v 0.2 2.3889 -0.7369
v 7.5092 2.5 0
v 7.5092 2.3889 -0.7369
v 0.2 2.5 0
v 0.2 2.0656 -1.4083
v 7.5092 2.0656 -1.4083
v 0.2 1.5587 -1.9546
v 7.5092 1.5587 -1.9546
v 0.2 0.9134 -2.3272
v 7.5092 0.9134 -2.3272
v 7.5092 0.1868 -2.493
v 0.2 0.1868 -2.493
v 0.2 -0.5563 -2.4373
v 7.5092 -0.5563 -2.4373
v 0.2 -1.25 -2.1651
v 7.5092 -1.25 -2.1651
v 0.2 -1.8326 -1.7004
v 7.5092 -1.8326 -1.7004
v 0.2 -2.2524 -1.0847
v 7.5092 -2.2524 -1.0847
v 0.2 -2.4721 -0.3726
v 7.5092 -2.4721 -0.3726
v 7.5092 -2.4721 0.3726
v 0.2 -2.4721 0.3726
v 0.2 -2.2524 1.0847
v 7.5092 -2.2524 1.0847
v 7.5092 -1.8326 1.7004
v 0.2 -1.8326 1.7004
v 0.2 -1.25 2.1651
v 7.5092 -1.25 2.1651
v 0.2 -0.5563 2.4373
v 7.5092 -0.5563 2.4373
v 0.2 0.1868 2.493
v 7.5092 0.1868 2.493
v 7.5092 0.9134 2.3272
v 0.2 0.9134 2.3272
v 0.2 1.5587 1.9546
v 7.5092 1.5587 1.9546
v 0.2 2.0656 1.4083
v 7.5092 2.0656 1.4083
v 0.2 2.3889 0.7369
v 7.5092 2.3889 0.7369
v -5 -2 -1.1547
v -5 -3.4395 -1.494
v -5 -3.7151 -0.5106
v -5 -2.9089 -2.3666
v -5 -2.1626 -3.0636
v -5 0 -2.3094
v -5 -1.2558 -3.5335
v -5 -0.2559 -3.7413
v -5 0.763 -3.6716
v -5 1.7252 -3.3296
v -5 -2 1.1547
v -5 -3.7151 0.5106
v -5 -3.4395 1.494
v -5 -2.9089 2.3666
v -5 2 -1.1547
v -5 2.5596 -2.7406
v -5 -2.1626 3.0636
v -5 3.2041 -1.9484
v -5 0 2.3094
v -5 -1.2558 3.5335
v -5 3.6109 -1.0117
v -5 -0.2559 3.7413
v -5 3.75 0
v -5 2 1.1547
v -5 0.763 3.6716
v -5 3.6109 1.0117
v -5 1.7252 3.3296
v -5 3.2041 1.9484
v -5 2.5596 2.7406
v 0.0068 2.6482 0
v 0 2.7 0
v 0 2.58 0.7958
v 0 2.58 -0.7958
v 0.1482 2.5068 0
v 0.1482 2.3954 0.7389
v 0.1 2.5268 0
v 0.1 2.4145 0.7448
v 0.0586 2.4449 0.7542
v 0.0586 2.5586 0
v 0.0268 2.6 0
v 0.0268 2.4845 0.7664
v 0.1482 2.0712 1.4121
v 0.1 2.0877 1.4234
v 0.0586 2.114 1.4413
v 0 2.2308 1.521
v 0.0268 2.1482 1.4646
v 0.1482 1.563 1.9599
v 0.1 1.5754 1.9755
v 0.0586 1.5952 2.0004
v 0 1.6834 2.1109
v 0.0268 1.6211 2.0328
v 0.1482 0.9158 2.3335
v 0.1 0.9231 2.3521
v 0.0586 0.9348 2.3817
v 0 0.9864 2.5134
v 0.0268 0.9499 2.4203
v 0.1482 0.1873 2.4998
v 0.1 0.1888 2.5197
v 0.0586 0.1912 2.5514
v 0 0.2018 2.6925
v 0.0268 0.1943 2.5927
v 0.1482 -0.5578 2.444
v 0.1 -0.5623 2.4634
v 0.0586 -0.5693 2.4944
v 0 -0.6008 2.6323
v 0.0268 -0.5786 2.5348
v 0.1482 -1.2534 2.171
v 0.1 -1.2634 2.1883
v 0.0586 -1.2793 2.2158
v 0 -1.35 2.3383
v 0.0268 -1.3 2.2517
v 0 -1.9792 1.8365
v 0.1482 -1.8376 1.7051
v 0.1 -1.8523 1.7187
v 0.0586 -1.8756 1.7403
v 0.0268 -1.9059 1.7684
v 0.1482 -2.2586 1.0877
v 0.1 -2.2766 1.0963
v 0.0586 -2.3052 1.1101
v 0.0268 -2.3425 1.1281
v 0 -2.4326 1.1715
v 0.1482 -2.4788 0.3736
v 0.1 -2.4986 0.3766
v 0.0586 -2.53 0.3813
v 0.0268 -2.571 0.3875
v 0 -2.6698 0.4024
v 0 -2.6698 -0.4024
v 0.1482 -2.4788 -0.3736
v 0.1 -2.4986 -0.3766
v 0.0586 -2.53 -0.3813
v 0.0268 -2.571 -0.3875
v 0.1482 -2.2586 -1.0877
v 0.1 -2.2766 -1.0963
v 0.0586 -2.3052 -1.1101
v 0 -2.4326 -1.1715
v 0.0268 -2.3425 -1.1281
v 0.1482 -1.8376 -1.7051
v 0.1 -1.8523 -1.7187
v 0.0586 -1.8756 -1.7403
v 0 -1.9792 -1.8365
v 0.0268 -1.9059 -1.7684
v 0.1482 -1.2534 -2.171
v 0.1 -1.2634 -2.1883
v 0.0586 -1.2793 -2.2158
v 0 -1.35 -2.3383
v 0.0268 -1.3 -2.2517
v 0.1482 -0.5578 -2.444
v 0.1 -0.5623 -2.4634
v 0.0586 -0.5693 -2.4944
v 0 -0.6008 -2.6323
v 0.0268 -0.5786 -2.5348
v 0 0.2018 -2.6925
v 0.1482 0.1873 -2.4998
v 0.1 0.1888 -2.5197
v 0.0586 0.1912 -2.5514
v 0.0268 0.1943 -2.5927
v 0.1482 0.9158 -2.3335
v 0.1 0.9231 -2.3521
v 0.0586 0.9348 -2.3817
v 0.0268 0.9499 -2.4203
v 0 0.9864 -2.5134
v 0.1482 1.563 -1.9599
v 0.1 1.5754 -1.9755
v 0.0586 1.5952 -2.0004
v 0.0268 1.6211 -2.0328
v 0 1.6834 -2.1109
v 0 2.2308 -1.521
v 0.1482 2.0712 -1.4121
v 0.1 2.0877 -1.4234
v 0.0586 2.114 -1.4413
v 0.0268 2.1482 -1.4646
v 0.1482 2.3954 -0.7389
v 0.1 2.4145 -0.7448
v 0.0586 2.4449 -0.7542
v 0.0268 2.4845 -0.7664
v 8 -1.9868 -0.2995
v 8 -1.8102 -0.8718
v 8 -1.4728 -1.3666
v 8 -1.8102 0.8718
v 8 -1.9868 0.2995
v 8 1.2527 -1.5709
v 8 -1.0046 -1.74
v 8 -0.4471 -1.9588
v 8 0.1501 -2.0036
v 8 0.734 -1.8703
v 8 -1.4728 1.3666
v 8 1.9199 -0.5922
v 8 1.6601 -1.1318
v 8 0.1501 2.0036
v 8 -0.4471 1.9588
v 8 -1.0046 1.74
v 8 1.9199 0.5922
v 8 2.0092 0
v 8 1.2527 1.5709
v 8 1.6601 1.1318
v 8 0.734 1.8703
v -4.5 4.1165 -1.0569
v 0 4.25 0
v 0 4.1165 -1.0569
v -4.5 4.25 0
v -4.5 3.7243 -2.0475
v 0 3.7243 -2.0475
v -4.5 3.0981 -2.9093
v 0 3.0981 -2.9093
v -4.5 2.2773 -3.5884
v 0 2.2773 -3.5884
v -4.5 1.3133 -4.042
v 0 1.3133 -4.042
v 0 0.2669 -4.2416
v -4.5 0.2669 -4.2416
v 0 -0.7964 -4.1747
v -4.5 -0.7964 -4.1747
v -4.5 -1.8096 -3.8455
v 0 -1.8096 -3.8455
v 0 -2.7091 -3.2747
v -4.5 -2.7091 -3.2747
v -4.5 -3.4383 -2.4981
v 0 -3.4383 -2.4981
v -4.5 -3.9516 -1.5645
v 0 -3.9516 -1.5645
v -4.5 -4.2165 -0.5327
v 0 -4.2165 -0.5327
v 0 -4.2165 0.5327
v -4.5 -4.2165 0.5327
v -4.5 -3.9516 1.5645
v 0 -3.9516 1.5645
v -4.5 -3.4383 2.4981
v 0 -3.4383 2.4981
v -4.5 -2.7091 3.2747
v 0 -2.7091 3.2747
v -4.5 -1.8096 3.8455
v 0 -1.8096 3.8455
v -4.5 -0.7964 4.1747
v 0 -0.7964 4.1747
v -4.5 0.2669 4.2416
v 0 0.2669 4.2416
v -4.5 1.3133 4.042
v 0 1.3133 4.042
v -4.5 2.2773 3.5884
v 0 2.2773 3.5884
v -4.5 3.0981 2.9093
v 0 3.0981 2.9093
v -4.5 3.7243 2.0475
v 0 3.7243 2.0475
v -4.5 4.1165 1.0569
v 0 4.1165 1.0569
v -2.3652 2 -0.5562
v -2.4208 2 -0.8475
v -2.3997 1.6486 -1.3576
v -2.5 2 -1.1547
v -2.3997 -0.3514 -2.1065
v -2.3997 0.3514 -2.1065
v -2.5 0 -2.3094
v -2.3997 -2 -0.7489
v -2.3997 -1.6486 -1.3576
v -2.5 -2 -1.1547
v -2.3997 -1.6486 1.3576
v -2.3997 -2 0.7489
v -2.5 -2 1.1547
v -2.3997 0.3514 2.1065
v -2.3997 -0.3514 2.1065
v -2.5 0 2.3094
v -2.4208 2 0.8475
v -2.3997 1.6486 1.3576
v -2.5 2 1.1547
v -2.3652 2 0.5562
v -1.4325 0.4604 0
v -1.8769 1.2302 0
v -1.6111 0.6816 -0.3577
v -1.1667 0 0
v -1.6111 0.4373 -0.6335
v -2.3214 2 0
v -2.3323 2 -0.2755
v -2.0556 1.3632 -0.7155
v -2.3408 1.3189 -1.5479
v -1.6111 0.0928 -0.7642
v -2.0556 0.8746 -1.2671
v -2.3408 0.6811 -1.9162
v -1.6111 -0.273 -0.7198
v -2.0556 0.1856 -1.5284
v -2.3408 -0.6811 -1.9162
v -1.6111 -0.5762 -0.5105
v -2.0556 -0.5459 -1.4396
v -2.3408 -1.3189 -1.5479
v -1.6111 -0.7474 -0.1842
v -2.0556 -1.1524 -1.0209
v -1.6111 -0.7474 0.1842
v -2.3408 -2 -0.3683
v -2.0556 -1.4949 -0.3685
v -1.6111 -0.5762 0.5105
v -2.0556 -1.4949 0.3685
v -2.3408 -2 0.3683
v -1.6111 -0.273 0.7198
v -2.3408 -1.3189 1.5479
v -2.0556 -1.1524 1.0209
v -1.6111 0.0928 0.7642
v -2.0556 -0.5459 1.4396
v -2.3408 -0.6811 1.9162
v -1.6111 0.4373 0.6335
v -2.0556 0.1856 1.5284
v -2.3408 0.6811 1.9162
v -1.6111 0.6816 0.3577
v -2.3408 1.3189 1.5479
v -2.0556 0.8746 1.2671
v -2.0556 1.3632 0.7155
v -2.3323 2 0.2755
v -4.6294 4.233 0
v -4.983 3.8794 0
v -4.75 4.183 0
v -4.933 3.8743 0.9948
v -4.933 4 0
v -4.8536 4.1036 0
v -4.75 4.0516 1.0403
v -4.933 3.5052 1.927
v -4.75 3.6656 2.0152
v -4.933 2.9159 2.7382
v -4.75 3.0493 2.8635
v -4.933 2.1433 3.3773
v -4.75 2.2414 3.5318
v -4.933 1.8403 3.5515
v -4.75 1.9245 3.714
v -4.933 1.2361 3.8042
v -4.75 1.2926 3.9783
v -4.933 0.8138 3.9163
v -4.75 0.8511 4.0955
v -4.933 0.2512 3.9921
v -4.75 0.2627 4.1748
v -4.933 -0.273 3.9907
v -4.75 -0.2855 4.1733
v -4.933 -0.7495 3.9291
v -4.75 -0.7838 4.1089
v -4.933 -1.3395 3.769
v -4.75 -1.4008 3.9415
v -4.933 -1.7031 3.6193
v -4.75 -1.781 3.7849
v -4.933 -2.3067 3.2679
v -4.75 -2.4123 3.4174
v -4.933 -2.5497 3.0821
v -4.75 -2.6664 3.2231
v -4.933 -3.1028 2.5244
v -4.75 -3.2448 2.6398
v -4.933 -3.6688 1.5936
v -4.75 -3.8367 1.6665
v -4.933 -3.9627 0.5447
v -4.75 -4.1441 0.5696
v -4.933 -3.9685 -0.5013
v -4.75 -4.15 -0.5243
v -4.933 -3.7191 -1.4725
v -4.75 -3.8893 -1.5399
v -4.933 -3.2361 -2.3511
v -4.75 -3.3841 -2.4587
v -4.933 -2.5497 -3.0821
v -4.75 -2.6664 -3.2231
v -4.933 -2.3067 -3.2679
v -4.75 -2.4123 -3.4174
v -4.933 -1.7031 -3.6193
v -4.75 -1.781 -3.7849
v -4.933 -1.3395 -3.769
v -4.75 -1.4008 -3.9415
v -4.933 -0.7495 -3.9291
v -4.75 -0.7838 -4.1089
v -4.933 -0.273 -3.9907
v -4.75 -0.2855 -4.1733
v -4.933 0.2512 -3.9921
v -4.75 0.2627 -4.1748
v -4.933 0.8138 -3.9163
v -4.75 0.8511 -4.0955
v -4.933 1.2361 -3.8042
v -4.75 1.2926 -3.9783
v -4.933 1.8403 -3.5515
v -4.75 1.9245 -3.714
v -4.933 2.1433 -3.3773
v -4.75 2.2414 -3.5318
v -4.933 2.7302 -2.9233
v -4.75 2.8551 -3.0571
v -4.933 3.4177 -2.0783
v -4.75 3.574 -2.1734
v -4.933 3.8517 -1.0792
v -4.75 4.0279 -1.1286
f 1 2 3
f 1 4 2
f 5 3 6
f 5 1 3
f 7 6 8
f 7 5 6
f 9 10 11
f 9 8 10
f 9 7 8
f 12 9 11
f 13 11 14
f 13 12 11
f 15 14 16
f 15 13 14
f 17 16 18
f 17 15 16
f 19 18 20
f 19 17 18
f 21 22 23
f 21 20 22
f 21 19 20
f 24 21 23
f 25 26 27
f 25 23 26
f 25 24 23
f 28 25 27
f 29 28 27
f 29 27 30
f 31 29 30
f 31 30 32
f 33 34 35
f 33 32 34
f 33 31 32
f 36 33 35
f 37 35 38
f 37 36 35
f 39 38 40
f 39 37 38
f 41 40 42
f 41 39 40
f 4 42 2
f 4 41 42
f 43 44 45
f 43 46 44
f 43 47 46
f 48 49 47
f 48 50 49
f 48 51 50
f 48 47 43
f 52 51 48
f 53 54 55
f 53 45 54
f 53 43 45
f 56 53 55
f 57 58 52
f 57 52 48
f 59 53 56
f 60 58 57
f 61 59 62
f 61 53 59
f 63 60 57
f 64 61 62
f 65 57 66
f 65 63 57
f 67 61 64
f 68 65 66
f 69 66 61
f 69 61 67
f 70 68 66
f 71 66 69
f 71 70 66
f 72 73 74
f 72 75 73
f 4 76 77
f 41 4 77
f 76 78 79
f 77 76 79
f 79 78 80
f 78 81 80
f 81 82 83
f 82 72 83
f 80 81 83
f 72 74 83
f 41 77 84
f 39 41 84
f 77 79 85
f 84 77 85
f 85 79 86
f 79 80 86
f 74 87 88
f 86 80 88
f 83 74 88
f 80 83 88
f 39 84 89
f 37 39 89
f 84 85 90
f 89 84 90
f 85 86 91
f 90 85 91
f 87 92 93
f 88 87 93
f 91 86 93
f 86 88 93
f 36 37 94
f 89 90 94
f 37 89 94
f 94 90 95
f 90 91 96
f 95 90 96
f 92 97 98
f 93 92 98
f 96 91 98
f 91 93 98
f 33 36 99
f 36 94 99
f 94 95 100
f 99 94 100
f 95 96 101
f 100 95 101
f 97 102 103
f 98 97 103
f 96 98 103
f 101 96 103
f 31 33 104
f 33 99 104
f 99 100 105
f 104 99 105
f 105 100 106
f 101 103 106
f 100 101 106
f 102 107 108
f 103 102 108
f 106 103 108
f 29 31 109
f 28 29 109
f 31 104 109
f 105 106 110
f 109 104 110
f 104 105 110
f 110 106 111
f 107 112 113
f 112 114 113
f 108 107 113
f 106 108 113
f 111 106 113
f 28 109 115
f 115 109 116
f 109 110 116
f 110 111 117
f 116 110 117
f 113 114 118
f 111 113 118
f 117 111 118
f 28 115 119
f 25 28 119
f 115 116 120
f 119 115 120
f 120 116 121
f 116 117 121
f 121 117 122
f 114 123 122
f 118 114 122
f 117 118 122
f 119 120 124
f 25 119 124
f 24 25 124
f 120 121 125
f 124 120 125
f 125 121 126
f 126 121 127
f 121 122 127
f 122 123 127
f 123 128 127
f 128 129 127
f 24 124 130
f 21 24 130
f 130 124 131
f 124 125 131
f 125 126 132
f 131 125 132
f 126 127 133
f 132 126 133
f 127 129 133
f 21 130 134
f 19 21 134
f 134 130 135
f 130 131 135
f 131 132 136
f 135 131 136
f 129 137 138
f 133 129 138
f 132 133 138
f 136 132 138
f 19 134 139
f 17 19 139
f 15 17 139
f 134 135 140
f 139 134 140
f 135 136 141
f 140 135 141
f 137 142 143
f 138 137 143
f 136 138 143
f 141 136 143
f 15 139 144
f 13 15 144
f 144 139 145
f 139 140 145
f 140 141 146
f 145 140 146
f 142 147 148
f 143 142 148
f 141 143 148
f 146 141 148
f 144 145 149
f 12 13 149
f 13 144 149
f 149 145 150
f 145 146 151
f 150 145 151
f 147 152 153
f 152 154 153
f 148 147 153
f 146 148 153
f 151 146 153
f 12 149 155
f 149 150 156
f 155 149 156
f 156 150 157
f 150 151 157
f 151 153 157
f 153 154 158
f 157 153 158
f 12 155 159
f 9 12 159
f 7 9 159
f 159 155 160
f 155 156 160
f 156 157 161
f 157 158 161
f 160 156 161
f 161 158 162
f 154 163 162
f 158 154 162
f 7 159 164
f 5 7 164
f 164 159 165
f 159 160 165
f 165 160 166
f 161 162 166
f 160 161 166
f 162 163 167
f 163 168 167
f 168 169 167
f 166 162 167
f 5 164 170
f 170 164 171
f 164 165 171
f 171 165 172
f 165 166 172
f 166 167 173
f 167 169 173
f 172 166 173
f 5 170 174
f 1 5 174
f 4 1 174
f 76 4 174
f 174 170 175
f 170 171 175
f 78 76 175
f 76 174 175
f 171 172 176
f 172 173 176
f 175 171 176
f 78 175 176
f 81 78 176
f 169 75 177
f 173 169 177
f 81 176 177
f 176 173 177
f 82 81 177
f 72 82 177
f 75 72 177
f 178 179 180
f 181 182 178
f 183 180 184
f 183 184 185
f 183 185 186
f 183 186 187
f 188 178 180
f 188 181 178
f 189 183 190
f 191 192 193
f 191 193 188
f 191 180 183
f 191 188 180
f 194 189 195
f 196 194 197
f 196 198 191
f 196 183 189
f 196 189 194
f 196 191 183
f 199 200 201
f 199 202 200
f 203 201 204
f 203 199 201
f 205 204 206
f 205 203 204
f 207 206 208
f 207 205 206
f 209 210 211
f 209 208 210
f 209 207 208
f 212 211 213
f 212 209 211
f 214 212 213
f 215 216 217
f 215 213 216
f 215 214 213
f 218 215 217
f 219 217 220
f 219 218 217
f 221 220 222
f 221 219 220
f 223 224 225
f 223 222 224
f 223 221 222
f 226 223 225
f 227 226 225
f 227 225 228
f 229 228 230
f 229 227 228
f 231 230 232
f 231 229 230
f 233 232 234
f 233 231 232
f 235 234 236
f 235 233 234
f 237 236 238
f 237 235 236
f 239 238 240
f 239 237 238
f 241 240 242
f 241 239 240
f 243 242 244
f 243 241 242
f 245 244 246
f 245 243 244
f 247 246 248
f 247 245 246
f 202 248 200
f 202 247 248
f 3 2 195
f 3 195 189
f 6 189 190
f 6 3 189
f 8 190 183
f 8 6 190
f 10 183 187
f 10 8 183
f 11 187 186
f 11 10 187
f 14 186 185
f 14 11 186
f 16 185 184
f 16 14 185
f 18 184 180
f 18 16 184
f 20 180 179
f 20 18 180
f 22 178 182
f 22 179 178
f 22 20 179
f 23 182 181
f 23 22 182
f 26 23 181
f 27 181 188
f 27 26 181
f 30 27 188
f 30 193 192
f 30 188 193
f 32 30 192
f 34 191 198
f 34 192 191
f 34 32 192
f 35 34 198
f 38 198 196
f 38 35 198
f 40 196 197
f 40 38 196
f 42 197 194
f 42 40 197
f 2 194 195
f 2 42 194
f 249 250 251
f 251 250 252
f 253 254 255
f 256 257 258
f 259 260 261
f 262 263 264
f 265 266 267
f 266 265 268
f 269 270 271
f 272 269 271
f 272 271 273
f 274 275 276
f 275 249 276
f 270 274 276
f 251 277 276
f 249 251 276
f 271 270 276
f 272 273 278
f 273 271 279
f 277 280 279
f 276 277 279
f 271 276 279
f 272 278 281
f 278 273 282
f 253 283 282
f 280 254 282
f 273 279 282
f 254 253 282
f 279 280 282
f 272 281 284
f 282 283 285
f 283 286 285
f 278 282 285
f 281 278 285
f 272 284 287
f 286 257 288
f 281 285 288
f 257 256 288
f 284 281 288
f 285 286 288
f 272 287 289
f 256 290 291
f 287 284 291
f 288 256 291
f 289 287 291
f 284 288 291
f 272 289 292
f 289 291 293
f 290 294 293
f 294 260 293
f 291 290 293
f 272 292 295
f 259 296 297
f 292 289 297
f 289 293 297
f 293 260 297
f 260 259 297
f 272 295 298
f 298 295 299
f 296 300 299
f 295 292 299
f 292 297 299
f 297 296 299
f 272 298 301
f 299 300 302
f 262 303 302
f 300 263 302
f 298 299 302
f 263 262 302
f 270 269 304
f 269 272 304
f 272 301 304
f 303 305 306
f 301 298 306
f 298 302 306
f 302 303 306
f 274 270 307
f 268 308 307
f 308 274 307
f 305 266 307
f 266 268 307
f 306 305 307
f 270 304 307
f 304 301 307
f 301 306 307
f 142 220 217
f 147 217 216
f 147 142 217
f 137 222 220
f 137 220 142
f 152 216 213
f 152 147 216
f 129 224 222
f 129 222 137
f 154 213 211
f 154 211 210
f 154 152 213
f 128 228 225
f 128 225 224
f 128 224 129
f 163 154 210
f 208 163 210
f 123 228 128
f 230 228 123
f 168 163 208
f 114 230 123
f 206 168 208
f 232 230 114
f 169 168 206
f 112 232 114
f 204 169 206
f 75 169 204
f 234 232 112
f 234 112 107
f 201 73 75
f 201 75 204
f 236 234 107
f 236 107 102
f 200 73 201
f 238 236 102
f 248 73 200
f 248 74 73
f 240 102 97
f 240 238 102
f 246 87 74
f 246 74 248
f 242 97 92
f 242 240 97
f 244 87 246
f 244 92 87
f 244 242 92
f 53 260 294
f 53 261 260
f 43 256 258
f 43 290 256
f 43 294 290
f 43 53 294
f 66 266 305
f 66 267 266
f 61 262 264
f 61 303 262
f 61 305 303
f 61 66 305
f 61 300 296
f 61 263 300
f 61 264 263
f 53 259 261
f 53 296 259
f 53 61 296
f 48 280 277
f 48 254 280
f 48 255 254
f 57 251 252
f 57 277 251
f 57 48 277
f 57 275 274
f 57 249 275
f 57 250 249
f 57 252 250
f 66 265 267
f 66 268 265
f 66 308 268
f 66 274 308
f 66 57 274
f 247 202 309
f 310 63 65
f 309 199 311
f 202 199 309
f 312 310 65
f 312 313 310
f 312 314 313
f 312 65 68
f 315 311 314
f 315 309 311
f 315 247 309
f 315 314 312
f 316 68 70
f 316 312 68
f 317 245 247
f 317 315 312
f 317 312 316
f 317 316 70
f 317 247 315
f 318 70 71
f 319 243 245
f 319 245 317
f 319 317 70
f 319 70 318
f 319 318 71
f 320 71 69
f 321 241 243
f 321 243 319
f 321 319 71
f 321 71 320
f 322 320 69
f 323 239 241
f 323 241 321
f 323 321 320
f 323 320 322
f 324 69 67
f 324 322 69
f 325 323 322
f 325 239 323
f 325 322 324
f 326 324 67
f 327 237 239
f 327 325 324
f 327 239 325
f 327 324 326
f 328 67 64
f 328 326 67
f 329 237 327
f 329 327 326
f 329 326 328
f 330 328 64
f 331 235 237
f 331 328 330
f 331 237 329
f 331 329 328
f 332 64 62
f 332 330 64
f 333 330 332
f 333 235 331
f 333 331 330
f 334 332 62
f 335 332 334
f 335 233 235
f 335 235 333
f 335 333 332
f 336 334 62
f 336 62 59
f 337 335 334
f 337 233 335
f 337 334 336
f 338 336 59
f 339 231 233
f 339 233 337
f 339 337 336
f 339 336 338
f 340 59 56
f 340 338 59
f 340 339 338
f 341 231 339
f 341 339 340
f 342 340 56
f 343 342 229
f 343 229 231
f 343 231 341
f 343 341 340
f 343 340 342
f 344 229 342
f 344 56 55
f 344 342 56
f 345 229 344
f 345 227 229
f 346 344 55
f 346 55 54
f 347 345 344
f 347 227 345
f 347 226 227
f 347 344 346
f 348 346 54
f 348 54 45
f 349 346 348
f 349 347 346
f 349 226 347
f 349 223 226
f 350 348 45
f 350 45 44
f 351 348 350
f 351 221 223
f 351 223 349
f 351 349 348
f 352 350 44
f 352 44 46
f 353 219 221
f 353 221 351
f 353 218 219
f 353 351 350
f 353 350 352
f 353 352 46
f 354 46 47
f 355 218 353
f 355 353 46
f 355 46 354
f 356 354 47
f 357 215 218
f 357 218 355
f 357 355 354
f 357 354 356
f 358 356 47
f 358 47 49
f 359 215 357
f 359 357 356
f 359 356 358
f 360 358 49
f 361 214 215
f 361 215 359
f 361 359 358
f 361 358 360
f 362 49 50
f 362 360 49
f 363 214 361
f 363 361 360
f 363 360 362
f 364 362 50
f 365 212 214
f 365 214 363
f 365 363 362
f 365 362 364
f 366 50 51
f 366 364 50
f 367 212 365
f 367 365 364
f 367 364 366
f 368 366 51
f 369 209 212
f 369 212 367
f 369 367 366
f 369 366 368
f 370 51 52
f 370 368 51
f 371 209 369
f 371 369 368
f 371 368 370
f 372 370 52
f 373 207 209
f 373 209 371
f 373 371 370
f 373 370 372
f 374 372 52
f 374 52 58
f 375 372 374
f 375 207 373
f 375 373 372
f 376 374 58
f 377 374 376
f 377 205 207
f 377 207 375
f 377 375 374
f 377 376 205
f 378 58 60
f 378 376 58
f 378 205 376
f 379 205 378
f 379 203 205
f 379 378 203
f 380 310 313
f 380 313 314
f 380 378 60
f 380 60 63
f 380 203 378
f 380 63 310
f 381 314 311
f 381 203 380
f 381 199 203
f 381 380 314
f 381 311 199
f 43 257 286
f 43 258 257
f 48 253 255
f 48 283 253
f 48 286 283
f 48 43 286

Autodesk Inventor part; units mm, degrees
ref_plane "YZ Plane" through (0, 0, 0) normal (1, 0, 0) x (0, 1, 0)
ref_plane "XZ Plane" through (0, 0, 0) normal (0, 1, 0) x (-1, 0, 0)
sketch "Sketch1" plane through (0, 0, 0) normal (0, 0, 1) x (1, 0, 0)
  line L0 (-1.1667, 0) -> (8, 0)
  line L1 (8, 0) -> (8, 2.5)
  line L2 (8, 2.5) -> (2, 2.5)
  line L3 (2, 2.5) -> (1.5091, 2.5)
  line L4 (1.5091, 2.5) -> (0, 2.5)
  line L5 (0, 2.5) -> (0, 4.25)
  line L6 (0, 4.25) -> (-5, 4.25)
  line L7 (-5, 4.25) -> (-5, 2.3094)
  line L8 (-5, 2.3094) -> (-2.5, 2.3094)
  line L9 (-2.5, 2.3094) -> (-1.1667, 0)
  line L10 (-7.6, 0) -> (10.6, 0) projected
  line L11 (0, -0.85) -> (0, 5.1) projected
  line L12 (2, 2.5) -> (0, 2.5) construction
  dimension "d1" = 6
  dimension "d2" = 0.4909
  dimension "d3" = 5
  dimension "d4" = 2.5
  dimension "d5" = 60
  dimension "d6" = 5
  dimension "d7" = 5
  dimension "d8" = 4.6188
  dimension "d9" = 8.5
  dimension "d26" = 8
revolve "Body" add sketch "Sketch1" angle 360 about axis through (-1.1667, 0, 0) along (1, 0, 0)
sketch "Sketch2" plane through (-5, 0, 0) normal (-1, 0, 0) x (0, 0, 1)
  circle A0 centre (0, 0) radius 2.3094 projected
  line L0 (0, -5.95) -> (0, 5.95) projected
  line L1 (-5.95, 0) -> (5.95, 0) projected
  line L2 (2.3094, 0) -> (1.1547, -2)
  line L3 (1.1547, -2) -> (-1.1547, -2)
  line L4 (-1.1547, -2) -> (-2.3094, 0)
  line L5 (-2.3094, 0) -> (-1.1547, 2)
  line L6 (-1.1547, 2) -> (1.1547, 2)
  line L7 (1.1547, 2) -> (2.3094, 0)
extrude "Slot" add sketch "Sketch2" against normal up to next contours L7 A0 | A0 L2 | L6 L0 A0 | A0 L0 L3 | L0 L6 A0 | A0 L3 L0 | L4 A0 | A0 L5
fillet "Fillet1" radius 0.5 1 edges at (-5, -4.25, 0)
thread "Thread" size "M5x0.8" class "6g" standard "ISO Metric profile" length 6
chamfer "Chamfer1" distance 0.4908 distance2 0.4908 1 edges at (8, -2.5, 0) measured on face at (8, -0.6238, -0.819)
ref_plane "Work Plane1" through (29, 0, 0) normal (0, -1, 0) x (1, 0, 0)
fillet "Fillet2" radius 0.2 1 edges at (0, -2.5, 0)
equation "\"d1\" = GEL"
equation "\"d3\" = KOH"
equation "\"d4\" = INTI"
equation "\"d6\" = GD"
equation "\"d7\" = BDM"
equation "\"d8\" = 1.1547 * SW"
equation "\"d9\" = KOD"
equation "\"d26\" = NLG"
equation "\"d30\" = R"
equation "\"d17\" = RR"
equation "\"d13\" = GEL"
equation "\"d15\" = -0.5 * SPD + 0.5 * GD"
equation "\"d16\" = GUL"
equation "\"GD\" = NND"
equation "\"NLG\" = 8"
equation "\"GEL\" = 6"
equation "\"KOD\" = 8.5"
equation "\"KOH\" = 5"
equation "\"INTI\" = 2.5"
equation "\"GAL\" = 0.61345 * PTC"
equation "\"GUL\" = 0.61345 * PTC"
equation "\"BDM\" = NND"
equation "\"SW\" = 4"
equation "\"RR\" = 0.5"
equation "\"SPD\" = NND - 1.2269 * PTC"
equation "\"R\" = 0.2"
equation "\"TOA\" = 30deg"
equation "\"GD1\" = THREADDIA - 1.2269 * PTC"
equation "\"THREADDIA\" = 5"
equation "\"FAWI\" = 45deg"
equation "\"ANG\" = 120deg"
equation "\"PTC\" = 0.8"
equation "\"NND\" = 5"
equation "\"E0\" = 1.155 * SW"
properties part number "DIN 912 - M5 x 8" material "Steel, Mild"
